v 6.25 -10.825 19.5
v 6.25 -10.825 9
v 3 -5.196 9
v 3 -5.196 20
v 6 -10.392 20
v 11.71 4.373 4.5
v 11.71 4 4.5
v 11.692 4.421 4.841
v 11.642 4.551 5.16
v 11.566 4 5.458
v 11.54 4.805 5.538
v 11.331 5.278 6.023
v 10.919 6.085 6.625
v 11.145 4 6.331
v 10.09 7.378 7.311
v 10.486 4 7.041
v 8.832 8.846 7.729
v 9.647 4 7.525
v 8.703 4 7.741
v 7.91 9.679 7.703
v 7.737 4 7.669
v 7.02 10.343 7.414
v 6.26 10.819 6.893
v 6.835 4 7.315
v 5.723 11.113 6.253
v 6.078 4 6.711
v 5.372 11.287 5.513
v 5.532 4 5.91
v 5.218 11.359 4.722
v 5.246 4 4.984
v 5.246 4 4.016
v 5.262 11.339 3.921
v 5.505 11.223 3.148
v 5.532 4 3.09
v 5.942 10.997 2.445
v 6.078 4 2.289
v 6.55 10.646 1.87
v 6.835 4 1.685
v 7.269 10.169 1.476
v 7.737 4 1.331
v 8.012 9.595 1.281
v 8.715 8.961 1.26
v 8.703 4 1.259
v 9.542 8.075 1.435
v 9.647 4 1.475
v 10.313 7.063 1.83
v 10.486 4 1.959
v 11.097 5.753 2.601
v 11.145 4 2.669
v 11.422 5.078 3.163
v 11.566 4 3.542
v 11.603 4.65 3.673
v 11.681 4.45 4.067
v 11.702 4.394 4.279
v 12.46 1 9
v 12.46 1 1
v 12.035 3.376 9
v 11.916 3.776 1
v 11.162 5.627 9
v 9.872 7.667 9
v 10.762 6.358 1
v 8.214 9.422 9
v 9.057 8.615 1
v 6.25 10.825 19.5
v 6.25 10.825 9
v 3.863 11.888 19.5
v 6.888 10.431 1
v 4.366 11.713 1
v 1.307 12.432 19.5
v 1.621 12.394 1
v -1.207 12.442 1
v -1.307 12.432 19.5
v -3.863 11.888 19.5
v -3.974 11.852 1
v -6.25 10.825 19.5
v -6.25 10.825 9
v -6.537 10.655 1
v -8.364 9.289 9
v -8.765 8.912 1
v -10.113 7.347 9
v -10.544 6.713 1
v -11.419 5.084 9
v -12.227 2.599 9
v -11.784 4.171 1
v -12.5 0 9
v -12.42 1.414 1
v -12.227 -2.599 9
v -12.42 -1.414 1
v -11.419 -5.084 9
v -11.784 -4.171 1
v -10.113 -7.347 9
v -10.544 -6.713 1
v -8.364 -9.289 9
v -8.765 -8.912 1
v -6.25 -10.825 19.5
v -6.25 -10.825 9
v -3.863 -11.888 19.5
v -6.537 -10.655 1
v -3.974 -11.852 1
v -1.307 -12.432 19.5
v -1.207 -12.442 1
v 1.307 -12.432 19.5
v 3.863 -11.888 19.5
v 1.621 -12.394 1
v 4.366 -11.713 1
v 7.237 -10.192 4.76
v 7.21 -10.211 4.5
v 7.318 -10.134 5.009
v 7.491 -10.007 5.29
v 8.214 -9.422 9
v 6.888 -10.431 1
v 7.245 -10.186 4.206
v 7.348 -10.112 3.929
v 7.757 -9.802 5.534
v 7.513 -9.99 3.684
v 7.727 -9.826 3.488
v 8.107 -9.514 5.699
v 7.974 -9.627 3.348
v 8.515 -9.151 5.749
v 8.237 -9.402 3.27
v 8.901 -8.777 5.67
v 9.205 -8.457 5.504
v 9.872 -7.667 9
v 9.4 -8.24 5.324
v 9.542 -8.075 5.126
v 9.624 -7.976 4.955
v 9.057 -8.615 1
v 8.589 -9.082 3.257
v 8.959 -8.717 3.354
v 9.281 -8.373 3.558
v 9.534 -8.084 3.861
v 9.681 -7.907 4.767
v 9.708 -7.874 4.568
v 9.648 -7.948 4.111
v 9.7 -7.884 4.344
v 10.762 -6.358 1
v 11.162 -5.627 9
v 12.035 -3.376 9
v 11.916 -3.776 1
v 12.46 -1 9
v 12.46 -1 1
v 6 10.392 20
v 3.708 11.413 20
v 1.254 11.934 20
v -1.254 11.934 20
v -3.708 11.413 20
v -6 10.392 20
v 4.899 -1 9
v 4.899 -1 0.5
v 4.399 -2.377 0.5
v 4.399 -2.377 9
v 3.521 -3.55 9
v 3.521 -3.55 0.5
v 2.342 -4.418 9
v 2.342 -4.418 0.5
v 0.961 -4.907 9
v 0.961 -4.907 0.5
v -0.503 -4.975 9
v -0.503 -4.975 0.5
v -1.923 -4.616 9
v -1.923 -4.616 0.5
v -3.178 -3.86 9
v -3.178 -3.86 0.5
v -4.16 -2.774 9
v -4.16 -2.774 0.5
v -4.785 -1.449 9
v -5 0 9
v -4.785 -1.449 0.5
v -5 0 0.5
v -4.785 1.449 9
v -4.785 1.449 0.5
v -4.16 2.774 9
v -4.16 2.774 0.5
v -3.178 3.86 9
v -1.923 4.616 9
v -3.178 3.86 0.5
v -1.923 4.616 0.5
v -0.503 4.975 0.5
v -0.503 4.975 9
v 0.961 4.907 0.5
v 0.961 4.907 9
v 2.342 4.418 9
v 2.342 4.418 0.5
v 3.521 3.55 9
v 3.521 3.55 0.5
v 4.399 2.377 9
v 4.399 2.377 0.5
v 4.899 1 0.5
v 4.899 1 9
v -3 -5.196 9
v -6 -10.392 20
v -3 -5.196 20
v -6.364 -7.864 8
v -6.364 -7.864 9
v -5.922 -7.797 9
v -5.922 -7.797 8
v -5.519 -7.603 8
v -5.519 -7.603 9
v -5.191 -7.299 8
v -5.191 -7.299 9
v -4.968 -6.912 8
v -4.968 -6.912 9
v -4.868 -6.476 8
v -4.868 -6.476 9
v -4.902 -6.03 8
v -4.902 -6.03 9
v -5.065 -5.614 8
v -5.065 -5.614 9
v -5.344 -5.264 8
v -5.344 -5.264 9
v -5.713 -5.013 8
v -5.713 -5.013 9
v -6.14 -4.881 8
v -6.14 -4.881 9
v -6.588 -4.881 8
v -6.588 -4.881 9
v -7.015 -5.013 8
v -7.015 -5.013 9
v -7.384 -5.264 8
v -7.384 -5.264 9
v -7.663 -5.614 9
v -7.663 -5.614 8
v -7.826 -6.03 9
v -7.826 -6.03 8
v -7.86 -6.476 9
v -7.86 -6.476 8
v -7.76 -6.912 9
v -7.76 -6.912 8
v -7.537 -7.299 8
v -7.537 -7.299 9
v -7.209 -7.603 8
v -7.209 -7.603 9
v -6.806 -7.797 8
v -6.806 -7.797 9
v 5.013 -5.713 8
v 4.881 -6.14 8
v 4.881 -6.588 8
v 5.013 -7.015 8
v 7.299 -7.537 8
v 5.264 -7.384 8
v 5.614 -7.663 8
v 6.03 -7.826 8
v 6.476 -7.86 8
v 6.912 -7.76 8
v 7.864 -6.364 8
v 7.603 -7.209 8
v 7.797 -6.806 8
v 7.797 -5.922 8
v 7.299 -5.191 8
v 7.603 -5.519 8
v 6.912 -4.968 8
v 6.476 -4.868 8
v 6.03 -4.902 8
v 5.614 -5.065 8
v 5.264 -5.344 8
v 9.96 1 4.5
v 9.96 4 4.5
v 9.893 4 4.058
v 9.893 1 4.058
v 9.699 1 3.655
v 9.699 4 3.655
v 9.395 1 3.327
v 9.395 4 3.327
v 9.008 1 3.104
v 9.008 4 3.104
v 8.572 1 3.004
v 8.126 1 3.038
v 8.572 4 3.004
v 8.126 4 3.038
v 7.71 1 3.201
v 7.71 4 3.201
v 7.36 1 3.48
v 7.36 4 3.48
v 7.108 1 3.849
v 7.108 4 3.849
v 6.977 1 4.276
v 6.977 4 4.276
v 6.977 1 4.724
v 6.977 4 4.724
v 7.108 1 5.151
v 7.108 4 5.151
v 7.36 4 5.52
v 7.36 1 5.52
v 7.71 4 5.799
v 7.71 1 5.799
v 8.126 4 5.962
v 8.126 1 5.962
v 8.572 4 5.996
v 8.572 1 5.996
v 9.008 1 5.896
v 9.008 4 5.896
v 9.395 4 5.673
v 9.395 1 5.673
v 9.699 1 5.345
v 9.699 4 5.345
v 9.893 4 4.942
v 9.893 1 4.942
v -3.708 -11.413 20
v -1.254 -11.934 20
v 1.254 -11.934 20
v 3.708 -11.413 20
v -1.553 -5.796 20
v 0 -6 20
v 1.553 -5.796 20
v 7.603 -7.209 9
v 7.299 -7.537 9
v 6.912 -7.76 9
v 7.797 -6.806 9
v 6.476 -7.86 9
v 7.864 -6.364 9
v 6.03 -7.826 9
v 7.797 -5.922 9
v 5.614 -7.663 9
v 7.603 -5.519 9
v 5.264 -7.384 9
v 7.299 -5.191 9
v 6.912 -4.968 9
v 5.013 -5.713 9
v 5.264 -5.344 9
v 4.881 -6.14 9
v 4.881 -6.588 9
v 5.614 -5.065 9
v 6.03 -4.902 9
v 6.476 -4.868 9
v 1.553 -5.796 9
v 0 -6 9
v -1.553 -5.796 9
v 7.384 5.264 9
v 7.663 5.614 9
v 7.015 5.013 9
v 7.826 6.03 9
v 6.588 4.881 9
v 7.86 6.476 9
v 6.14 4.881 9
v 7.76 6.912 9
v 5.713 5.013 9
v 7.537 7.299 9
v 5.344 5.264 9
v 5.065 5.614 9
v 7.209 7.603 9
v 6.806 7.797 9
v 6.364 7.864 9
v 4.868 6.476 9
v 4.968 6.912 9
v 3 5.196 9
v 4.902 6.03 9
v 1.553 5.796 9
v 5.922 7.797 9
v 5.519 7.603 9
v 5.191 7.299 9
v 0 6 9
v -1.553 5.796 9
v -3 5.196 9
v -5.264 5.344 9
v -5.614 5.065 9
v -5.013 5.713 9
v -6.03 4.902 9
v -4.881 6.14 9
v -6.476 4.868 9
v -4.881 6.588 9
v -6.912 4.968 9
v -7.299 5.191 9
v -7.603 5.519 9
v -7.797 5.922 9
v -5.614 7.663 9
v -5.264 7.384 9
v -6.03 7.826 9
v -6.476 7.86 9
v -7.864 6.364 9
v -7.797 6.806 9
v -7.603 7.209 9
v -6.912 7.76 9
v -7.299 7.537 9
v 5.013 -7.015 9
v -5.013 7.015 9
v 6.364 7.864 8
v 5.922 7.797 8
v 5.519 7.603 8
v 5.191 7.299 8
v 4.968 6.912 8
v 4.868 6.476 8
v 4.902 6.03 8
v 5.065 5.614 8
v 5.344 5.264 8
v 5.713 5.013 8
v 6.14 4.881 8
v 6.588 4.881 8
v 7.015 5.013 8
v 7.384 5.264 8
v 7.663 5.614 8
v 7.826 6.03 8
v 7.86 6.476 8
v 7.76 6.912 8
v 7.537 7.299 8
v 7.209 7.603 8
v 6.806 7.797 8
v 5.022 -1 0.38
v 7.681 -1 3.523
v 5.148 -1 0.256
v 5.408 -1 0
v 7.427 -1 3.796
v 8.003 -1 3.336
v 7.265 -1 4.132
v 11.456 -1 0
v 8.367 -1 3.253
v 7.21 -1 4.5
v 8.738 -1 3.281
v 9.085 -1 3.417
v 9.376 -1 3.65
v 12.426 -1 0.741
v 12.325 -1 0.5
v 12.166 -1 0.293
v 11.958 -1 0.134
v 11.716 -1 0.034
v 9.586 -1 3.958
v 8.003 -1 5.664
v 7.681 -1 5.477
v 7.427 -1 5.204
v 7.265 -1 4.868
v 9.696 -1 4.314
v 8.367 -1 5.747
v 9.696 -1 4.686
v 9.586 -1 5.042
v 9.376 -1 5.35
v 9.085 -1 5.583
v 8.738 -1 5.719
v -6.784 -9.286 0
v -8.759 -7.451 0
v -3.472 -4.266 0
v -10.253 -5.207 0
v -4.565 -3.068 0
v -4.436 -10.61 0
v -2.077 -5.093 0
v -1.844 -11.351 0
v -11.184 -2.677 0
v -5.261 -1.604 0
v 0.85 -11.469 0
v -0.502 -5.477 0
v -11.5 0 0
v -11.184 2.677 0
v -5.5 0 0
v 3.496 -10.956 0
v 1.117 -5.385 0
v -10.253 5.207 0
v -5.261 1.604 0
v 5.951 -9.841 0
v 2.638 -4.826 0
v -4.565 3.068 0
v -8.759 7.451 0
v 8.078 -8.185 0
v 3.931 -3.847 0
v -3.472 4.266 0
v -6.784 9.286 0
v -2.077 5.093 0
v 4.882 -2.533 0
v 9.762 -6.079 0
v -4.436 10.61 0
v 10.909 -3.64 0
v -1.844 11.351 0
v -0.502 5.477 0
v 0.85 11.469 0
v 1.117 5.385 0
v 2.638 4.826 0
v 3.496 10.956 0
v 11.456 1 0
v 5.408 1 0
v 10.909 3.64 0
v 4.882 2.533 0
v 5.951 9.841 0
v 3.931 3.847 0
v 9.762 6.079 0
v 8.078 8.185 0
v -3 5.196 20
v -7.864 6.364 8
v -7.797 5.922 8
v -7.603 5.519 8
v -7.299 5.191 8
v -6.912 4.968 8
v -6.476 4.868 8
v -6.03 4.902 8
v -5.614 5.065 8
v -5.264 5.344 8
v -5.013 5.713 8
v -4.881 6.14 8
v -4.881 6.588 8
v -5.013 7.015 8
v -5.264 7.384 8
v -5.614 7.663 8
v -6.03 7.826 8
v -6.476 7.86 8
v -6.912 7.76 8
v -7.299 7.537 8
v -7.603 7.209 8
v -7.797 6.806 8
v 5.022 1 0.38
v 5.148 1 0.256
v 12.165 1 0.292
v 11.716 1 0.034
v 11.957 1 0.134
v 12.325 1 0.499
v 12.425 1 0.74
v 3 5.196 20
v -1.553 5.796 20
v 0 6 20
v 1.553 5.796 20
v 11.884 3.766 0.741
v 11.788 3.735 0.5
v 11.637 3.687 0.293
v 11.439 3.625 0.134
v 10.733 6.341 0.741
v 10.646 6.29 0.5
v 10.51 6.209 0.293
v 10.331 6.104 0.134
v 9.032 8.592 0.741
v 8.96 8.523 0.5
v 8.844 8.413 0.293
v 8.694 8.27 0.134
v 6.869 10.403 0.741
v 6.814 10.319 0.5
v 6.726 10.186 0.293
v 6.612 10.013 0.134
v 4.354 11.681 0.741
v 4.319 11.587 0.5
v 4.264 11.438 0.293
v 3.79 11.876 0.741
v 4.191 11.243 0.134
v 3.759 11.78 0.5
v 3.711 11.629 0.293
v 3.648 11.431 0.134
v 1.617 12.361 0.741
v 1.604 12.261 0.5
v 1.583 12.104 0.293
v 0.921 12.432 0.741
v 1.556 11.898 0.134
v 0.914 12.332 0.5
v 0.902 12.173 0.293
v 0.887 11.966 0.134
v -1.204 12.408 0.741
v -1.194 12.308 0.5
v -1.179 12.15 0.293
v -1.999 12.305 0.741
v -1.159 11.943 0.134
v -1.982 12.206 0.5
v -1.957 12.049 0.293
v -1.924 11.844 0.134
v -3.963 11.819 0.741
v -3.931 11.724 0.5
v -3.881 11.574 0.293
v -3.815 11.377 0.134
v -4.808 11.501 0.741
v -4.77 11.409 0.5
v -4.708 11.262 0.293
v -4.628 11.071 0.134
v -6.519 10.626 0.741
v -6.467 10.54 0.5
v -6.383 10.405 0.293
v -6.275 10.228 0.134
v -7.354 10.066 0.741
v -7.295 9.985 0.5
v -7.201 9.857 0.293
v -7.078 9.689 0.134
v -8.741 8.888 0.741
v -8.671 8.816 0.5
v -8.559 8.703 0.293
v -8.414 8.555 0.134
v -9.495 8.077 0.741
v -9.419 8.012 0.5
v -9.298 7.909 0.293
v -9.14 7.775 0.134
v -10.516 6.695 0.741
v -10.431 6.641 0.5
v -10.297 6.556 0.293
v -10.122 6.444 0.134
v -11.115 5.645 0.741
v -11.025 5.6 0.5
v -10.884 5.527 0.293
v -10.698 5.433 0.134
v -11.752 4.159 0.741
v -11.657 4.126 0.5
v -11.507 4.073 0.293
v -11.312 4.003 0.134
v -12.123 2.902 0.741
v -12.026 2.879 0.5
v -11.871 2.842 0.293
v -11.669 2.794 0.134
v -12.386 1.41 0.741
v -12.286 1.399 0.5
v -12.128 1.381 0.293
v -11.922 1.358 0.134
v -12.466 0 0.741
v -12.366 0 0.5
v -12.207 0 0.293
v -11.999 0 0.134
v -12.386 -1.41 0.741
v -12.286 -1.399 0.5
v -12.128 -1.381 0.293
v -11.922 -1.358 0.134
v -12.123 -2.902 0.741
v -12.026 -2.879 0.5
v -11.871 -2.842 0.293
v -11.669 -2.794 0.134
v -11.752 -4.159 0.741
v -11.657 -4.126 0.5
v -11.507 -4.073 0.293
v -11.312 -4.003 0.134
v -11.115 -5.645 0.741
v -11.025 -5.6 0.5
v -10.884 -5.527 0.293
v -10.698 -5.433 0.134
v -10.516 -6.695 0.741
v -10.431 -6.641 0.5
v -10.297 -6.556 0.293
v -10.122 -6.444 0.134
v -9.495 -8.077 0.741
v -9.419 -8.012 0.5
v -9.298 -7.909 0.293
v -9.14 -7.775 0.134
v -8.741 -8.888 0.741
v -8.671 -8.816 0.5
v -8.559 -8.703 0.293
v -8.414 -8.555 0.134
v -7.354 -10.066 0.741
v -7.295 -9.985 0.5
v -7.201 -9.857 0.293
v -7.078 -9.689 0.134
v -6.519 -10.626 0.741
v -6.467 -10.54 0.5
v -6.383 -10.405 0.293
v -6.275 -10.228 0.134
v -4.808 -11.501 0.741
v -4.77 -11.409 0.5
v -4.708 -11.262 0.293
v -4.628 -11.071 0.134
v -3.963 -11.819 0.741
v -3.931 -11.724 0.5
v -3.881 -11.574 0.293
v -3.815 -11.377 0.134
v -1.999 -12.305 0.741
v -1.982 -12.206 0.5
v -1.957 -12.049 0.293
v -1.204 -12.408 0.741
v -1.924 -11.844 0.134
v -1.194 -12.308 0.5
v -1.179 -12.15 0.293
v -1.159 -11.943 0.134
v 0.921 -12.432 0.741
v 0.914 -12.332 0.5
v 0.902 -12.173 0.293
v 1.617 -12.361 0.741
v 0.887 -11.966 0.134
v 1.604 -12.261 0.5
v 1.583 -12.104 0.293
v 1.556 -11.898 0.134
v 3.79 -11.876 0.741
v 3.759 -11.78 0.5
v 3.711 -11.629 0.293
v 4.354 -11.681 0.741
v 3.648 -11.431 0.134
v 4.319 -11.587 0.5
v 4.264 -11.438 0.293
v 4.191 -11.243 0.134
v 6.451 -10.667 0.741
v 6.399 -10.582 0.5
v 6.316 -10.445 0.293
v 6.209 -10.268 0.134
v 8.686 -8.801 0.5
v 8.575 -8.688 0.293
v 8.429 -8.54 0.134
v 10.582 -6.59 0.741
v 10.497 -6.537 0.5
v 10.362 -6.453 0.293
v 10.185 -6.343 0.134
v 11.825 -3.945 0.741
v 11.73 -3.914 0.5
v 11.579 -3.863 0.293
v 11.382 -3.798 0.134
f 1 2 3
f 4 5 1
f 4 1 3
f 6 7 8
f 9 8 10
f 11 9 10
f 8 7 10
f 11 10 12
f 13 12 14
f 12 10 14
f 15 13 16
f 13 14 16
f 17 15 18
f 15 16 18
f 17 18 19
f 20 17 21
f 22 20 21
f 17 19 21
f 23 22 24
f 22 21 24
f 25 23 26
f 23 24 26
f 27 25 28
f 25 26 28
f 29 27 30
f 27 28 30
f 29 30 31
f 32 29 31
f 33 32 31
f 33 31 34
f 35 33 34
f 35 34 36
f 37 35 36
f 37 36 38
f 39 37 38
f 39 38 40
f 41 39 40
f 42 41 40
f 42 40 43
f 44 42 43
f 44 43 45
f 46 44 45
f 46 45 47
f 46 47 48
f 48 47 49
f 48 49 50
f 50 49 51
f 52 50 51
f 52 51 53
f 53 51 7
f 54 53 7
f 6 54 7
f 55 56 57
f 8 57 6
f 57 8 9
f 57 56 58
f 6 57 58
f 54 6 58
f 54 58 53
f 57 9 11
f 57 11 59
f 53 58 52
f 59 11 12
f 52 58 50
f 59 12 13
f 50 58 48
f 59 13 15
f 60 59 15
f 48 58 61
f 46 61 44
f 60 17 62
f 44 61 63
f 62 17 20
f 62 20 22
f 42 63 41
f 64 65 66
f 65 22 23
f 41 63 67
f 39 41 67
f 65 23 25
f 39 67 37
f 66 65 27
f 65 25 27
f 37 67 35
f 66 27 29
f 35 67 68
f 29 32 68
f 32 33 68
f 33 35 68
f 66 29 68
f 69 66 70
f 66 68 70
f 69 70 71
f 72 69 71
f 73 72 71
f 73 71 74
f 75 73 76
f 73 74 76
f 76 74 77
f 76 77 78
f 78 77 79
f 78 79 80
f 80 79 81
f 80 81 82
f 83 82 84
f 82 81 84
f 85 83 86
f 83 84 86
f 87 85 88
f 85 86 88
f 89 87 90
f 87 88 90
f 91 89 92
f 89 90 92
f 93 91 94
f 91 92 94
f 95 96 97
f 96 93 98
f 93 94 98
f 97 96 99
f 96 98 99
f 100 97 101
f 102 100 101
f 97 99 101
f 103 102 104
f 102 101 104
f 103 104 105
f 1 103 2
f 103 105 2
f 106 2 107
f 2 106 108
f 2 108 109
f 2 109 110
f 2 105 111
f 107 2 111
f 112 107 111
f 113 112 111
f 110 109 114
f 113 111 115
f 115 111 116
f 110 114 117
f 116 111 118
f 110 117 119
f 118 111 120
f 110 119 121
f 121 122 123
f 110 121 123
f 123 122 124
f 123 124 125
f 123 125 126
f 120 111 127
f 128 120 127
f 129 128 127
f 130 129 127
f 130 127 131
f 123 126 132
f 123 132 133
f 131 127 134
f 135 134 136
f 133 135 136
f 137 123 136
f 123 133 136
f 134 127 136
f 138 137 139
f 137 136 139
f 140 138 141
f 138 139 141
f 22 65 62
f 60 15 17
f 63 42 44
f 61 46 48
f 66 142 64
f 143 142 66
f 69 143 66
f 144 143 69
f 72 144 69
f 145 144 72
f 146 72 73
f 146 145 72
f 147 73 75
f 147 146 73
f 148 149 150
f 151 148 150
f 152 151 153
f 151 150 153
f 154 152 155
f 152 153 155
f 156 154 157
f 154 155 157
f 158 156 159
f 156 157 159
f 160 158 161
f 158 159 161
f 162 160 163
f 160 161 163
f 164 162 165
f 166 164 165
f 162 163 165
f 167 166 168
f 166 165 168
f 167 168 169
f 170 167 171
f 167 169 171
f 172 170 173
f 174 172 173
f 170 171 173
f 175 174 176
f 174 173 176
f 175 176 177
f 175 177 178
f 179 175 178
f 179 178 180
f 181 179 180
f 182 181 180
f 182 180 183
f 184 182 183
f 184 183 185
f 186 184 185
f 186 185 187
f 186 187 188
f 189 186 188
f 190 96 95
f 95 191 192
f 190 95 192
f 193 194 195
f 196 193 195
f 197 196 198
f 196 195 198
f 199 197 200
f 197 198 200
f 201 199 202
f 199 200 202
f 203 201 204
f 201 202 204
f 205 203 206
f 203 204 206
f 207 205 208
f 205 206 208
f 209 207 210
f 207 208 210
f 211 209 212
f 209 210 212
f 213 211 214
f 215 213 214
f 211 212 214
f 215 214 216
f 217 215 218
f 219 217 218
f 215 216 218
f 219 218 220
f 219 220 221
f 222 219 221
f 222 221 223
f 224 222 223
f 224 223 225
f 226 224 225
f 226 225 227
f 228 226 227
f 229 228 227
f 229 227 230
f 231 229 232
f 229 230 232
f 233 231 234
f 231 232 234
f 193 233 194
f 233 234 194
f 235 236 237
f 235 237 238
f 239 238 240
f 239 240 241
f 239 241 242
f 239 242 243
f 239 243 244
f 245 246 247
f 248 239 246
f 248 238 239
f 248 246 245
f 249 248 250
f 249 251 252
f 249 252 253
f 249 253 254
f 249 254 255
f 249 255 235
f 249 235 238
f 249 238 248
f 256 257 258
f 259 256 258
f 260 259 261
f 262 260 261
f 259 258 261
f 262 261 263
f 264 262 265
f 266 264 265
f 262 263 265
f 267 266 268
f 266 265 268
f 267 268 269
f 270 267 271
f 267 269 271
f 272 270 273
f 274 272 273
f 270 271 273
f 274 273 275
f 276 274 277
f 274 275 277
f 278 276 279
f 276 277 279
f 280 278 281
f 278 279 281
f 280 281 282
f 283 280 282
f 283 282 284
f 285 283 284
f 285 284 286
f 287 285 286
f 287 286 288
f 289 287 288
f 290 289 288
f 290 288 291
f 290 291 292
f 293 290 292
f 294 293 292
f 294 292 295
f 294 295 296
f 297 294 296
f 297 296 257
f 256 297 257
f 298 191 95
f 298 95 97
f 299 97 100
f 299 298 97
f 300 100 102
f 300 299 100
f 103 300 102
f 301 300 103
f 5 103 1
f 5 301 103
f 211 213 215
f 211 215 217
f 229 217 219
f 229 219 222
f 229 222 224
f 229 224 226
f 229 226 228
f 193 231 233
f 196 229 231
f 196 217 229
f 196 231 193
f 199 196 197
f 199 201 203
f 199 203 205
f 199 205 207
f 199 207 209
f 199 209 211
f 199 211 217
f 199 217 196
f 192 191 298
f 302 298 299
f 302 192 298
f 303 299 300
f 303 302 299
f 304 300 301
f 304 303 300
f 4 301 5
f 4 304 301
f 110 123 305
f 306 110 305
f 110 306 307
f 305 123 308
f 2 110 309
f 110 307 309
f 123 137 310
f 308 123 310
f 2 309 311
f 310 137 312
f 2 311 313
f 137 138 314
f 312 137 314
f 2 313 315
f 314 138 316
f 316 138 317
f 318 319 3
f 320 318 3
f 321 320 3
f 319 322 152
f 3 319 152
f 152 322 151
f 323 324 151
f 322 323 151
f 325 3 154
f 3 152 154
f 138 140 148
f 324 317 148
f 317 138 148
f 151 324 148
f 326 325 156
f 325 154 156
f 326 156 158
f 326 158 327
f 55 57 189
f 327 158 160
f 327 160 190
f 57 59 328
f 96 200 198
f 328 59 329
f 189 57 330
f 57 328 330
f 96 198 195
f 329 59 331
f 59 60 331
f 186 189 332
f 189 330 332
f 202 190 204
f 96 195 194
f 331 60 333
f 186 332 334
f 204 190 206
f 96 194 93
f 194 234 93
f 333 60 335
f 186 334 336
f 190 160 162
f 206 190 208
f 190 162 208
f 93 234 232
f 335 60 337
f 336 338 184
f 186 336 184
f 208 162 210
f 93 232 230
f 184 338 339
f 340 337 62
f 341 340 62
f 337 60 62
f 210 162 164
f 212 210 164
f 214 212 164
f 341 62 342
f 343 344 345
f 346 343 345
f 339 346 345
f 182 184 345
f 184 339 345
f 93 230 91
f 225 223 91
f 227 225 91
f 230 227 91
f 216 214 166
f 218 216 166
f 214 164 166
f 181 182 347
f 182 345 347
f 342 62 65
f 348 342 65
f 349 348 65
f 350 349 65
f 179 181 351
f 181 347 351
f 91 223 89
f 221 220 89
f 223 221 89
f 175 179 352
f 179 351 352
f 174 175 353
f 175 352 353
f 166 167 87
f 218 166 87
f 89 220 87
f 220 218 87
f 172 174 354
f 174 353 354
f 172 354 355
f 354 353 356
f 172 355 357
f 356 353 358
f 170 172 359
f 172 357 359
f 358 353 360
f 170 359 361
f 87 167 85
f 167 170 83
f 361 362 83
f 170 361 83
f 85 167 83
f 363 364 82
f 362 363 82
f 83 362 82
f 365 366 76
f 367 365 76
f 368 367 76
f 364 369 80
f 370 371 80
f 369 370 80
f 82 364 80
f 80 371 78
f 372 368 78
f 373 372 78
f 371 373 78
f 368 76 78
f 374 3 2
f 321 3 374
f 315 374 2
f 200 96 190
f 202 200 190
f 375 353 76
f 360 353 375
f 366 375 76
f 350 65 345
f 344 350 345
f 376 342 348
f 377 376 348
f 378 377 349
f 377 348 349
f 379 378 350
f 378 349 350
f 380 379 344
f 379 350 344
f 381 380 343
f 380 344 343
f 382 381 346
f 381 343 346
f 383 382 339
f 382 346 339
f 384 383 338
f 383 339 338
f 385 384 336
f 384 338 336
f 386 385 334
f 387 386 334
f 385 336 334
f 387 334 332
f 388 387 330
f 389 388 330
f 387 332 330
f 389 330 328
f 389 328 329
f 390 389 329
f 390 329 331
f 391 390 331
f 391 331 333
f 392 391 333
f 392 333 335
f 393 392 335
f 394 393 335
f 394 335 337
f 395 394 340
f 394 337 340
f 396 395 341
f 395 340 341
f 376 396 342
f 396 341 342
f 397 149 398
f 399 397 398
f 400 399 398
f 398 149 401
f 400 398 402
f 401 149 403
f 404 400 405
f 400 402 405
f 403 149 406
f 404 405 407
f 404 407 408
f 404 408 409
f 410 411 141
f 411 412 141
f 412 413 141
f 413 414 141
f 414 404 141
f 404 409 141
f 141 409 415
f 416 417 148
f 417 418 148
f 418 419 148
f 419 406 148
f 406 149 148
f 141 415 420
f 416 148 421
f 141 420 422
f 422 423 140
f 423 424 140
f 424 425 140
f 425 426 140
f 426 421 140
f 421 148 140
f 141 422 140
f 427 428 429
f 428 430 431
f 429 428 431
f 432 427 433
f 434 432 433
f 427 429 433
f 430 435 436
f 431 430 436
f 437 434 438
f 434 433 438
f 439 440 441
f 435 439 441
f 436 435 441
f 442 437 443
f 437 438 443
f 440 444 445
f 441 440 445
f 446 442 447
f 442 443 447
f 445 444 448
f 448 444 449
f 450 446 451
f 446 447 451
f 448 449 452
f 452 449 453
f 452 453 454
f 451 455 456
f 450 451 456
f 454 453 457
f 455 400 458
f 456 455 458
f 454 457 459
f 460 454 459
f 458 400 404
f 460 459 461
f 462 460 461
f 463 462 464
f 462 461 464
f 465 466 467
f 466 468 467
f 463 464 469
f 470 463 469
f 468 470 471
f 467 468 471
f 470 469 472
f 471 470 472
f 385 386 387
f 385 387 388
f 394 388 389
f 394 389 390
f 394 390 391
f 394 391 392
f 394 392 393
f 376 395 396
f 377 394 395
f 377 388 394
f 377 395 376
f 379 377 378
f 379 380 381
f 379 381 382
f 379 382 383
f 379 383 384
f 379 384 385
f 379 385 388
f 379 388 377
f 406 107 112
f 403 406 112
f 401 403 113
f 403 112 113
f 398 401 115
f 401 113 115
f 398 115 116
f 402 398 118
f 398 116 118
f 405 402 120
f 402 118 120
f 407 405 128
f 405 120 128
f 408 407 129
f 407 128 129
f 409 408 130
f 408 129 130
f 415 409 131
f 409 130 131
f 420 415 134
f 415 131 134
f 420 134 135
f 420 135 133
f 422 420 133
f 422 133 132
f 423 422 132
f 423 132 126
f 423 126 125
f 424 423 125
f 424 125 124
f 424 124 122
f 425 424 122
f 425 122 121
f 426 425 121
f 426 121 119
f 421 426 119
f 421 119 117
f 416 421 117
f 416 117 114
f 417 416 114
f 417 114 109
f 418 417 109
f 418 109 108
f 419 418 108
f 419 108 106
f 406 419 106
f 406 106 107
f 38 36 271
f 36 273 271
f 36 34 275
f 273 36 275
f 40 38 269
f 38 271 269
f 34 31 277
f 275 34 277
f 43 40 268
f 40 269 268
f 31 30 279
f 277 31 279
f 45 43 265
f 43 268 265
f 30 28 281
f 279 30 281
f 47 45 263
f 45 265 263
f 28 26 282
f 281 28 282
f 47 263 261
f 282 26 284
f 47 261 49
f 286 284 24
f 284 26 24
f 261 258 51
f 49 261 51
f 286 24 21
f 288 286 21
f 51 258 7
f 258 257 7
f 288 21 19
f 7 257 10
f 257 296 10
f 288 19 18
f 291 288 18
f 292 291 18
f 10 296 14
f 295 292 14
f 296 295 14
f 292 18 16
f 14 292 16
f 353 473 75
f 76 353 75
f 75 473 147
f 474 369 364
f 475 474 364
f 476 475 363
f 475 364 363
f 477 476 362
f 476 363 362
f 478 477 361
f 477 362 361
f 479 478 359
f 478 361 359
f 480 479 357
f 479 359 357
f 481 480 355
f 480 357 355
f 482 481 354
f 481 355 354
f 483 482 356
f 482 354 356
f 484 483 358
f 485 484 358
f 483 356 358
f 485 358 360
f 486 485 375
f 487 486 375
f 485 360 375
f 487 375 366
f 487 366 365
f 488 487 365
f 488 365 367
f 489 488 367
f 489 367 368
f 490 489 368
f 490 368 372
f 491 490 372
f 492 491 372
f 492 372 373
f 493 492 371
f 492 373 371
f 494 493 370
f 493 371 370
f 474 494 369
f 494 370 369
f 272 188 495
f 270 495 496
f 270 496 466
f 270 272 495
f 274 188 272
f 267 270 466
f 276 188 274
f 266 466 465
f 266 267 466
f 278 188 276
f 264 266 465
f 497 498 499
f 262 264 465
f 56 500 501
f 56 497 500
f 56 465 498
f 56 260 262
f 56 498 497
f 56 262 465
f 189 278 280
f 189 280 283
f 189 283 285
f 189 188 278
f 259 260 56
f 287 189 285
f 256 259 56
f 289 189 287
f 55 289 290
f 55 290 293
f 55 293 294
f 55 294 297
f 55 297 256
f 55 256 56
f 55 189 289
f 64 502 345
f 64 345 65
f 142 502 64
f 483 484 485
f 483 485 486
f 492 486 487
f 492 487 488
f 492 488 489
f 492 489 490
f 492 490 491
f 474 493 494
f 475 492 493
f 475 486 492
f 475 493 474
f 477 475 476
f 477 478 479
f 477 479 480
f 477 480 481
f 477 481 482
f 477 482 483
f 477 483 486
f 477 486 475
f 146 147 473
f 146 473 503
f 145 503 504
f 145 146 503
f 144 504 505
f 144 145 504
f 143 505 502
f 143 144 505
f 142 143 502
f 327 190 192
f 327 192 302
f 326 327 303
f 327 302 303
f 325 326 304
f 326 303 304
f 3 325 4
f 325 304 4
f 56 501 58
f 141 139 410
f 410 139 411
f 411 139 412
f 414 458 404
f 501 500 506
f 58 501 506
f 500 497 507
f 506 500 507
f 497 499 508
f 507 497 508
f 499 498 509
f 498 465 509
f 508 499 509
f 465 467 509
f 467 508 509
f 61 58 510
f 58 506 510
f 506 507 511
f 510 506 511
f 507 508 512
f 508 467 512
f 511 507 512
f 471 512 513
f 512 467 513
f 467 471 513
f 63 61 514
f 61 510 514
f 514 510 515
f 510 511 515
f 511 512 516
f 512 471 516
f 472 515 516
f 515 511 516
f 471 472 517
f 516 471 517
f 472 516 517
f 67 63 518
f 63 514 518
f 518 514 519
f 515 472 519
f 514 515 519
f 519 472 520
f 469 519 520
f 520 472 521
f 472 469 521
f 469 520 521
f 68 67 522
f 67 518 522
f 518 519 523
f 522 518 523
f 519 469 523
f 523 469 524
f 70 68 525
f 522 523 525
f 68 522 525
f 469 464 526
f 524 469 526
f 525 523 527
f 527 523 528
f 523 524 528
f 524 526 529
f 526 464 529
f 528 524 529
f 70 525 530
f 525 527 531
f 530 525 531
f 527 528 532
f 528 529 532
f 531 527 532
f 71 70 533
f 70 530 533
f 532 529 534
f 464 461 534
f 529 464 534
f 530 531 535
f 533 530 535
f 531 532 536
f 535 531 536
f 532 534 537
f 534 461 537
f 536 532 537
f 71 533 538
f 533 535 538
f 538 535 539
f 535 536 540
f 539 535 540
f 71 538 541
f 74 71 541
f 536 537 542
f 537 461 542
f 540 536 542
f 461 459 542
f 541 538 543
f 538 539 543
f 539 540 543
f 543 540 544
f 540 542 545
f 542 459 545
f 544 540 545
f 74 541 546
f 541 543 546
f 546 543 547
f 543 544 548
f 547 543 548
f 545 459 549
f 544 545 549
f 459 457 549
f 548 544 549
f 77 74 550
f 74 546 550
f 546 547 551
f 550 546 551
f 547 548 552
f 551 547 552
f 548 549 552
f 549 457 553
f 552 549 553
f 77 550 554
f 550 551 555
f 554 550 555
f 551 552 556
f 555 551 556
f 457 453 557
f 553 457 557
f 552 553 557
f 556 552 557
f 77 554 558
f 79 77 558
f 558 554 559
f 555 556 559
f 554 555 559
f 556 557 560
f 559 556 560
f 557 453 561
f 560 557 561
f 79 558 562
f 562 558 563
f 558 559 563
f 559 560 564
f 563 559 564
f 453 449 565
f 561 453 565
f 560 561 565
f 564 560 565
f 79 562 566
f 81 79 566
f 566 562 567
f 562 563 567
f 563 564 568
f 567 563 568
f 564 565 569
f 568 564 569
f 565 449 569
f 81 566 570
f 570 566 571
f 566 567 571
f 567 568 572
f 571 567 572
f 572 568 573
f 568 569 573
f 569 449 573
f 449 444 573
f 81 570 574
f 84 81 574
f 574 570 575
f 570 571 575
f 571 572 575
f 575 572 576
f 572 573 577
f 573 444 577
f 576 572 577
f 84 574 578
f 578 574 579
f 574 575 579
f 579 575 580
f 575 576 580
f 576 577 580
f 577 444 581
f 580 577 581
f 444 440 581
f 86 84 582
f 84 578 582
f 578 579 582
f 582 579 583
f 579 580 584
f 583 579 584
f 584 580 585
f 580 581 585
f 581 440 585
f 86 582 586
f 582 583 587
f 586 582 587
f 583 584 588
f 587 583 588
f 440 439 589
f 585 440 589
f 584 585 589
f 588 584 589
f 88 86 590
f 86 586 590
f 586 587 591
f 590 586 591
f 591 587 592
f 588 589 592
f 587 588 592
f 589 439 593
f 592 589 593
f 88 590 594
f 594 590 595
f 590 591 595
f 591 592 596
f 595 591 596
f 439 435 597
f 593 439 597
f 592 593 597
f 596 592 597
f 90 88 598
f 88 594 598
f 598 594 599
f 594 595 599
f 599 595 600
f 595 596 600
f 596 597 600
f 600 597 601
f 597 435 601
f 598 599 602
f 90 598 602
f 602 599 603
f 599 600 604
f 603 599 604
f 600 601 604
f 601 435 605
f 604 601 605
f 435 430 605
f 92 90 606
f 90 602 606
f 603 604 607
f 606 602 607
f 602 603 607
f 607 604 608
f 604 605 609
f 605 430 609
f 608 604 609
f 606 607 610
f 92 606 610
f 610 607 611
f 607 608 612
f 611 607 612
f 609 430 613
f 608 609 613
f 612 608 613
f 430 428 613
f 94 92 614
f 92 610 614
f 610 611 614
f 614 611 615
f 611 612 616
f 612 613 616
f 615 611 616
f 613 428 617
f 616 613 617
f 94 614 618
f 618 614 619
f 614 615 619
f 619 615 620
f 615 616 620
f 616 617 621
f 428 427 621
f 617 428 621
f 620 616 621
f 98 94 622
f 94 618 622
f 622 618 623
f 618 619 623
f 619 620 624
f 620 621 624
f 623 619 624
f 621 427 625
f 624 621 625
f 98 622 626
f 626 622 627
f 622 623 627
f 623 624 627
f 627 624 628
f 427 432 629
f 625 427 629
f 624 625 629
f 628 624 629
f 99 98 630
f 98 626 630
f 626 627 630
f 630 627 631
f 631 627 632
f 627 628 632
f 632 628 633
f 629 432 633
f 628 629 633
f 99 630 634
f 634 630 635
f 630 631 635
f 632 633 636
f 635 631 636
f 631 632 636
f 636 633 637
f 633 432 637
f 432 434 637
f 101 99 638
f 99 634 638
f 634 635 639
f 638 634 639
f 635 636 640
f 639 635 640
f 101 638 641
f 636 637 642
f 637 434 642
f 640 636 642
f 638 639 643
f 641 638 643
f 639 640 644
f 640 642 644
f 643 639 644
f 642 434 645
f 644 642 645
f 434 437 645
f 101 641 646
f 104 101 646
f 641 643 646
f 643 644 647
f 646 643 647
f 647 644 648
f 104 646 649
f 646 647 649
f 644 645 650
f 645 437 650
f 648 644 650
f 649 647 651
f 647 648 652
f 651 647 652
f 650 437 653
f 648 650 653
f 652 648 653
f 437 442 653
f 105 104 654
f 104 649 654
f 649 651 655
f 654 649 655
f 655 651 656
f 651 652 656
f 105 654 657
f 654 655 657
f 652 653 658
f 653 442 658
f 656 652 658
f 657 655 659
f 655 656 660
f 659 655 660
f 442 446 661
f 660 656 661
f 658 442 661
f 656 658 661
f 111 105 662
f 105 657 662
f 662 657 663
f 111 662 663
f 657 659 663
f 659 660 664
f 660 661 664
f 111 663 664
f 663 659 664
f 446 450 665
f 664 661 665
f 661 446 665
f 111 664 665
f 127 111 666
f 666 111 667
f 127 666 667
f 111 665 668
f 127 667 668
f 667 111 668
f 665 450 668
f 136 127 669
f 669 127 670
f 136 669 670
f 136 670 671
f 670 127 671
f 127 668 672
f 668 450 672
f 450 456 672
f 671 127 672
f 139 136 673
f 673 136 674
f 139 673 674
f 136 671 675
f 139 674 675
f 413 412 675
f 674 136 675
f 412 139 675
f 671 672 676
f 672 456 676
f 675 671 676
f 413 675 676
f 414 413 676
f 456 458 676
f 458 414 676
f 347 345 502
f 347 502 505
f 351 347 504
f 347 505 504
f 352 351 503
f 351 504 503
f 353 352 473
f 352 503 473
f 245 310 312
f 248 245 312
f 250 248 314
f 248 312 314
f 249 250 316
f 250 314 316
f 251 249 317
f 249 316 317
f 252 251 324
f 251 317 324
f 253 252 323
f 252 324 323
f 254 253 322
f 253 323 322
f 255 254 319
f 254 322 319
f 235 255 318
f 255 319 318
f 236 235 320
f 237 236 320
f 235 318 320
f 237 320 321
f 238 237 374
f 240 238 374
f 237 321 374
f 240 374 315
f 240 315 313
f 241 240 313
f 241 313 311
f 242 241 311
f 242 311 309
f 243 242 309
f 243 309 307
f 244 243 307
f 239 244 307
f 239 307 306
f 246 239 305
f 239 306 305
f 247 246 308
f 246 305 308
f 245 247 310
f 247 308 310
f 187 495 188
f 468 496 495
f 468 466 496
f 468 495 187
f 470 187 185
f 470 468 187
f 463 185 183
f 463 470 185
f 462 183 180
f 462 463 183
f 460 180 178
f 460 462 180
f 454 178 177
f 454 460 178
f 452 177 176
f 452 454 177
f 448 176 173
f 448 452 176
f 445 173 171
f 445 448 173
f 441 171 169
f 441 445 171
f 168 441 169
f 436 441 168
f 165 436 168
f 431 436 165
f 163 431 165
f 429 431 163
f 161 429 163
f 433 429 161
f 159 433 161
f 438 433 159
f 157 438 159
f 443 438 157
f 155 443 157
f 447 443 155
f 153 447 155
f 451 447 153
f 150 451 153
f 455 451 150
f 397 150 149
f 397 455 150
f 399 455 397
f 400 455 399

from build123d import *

# Parameters (mm, degrees)
ESBO_O1_R                 = 12.5
RESSALTO_EXTRUS_O1_DEPTH  = 20
CORTE_EXTRUS_O3_DEPTH     = 11
ESBO_O3_R                 = 5
CORTE_EXTRUS_O4_DEPTH     = 21
ESBO_O6_W                 = 12
ESBO_O6_H                 = 2
CORTE_EXTRUS_O5_DEPTH     = 10
CORTE_EXTRUS_O6_START     = -3
ESBO_O7_R                 = 3.25
CORTE_EXTRUS_O6_DEPTH     = 9.5
FURO_ROSCADO_DE_M3X0_51_D = 2.5
FILETE1_R                 = 1
ESBO_O10_R                = 1.5
CORTE_EXTRUS_O7_DEPTH     = 1
CHANFRO1_SIZE             = 0.5
CORTE_EXTRUS_O8_REACH     = 18.5
ESBO_O11_R                = 1.5
ESBO_O12_R                = 6
CORTE_EXTRUS_O9_DEPTH     = 11
PADR_OCIRCULAR1_COUNT     = 4
CHANFRO2_SIZE             = 0.5


with BuildPart() as part:
    # Esboço1 → Ressalto-extrusão1 (new body)
    with BuildSketch(Plane.XY):
        Circle(ESBO_O1_R)
    extrude(amount=RESSALTO_EXTRUS_O1_DEPTH)

    # Esboço2 → Corte-extrusão3 (cut)
    with BuildSketch(Plane.XY.offset(20)):
        with BuildLine():
            Line((0, 0), (6.25, 10.825317547))
            ThreePointArc((6.25, 10.825317547), (12.5, 0), (6.25, -10.825317547))
            Line((6.25, -10.825317547), (0, 0))
        make_face()
    corte_extrus_o3 = extrude(amount=-CORTE_EXTRUS_O3_DEPTH, mode=Mode.SUBTRACT)

    # Esboço3 → Corte-extrusão4 (cut, through all)
    with BuildSketch(Plane(origin=(0, 0, 0), x_dir=(-1, 0, 0), z_dir=(0, 0, -1))):
        Circle(ESBO_O3_R)
    extrude(amount=-CORTE_EXTRUS_O4_DEPTH, mode=Mode.SUBTRACT)

    # Espelhar1: Corte-extrusão3 across plane
    add(corte_extrus_o3.mirror(Plane(origin=(0, 0, 0), x_dir=(0, 0, 1), z_dir=(1, 0, 0))), mode=Mode.SUBTRACT)

    # Esboço6 → Corte-extrusão5 (cut, through all)
    with BuildSketch(Plane.XY.offset(9)):
        with Locations((7, 0)):
            Rectangle(ESBO_O6_W, ESBO_O6_H)
    extrude(amount=-CORTE_EXTRUS_O5_DEPTH, mode=Mode.SUBTRACT)

    # Esboço7 → Corte-extrusão6 (cut, through all)
    with BuildSketch(Plane.XZ.offset(-1).offset(CORTE_EXTRUS_O6_START)):
        with Locations((8.459935794, 4.5)):
            Circle(ESBO_O7_R)
    extrude(amount=-CORTE_EXTRUS_O6_DEPTH, mode=Mode.SUBTRACT)

    # Furo roscado de M3x0.51 (through all)
    with Locations(Plane(origin=(0, 4, 0), x_dir=(1, 0, 0), z_dir=(0, 1, 0))):
        with Locations((8.459935794, -4.5)):
            Hole(FURO_ROSCADO_DE_M3X0_51_D / 2)

    # Filete1
    filete1_edges = [part.edges().sort_by_distance(p)[0] for p in [
        (-12.5, 0, 0),
    ]]
    fillet(filete1_edges, radius=FILETE1_R)

    # Esboço10 → Corte-extrusão7 (cut)
    with BuildSketch(Plane.XY.offset(9)):
        with Locations((6.363961031, -6.363961031)):
            Circle(ESBO_O10_R)
    corte_extrus_o7 = extrude(amount=-CORTE_EXTRUS_O7_DEPTH, mode=Mode.SUBTRACT)

    # Chanfro1
    chanfro1_edges = [part.edges().sort_by_distance(p)[0] for p in [
        (0, -12.5, 20),
        (0, 12.5, 20),
    ]]
    chamfer(chanfro1_edges, length=CHANFRO1_SIZE)

    # Esboço11 → Corte-extrusão8 (cut, up to next)
    with BuildSketch(Plane(origin=(0, 4, 0), x_dir=(1, 0, 0), z_dir=(0, 1, 0)), mode=Mode.PRIVATE) as corte_extrus_o8_sk1:
        with Locations((8.459935794, -4.5)):
            Circle(ESBO_O11_R)
    corte_extrus_o8_tool1 = extrude(corte_extrus_o8_sk1.sketch, amount=-CORTE_EXTRUS_O8_REACH, mode=Mode.PRIVATE) & part.part
    add(corte_extrus_o8_tool1.solids().sort_by_distance((8.459936, 4, 4.5))[0], mode=Mode.SUBTRACT)

    # Esboço12 → Corte-extrusão9 (cut)
    with BuildSketch(Plane.XY.offset(20)):
        Circle(ESBO_O12_R)
    extrude(amount=-CORTE_EXTRUS_O9_DEPTH, mode=Mode.SUBTRACT)

    # PadrãoCircular1: Corte-extrusão7 ×4 about axis
    padr_ocircular1_axis = Axis((0, 0, 0), (0, 0, 1))
    for i in range(1, PADR_OCIRCULAR1_COUNT):
        add(corte_extrus_o7.rotate(padr_ocircular1_axis, i * 360 / PADR_OCIRCULAR1_COUNT), mode=Mode.SUBTRACT)

    # Chanfro2
    chanfro2_edges = [part.edges().sort_by_distance(p)[0] for p in [
        (-5, 0, 0),
    ]]
    chamfer(chanfro2_edges, length=CHANFRO2_SIZE)


solid = part.part
